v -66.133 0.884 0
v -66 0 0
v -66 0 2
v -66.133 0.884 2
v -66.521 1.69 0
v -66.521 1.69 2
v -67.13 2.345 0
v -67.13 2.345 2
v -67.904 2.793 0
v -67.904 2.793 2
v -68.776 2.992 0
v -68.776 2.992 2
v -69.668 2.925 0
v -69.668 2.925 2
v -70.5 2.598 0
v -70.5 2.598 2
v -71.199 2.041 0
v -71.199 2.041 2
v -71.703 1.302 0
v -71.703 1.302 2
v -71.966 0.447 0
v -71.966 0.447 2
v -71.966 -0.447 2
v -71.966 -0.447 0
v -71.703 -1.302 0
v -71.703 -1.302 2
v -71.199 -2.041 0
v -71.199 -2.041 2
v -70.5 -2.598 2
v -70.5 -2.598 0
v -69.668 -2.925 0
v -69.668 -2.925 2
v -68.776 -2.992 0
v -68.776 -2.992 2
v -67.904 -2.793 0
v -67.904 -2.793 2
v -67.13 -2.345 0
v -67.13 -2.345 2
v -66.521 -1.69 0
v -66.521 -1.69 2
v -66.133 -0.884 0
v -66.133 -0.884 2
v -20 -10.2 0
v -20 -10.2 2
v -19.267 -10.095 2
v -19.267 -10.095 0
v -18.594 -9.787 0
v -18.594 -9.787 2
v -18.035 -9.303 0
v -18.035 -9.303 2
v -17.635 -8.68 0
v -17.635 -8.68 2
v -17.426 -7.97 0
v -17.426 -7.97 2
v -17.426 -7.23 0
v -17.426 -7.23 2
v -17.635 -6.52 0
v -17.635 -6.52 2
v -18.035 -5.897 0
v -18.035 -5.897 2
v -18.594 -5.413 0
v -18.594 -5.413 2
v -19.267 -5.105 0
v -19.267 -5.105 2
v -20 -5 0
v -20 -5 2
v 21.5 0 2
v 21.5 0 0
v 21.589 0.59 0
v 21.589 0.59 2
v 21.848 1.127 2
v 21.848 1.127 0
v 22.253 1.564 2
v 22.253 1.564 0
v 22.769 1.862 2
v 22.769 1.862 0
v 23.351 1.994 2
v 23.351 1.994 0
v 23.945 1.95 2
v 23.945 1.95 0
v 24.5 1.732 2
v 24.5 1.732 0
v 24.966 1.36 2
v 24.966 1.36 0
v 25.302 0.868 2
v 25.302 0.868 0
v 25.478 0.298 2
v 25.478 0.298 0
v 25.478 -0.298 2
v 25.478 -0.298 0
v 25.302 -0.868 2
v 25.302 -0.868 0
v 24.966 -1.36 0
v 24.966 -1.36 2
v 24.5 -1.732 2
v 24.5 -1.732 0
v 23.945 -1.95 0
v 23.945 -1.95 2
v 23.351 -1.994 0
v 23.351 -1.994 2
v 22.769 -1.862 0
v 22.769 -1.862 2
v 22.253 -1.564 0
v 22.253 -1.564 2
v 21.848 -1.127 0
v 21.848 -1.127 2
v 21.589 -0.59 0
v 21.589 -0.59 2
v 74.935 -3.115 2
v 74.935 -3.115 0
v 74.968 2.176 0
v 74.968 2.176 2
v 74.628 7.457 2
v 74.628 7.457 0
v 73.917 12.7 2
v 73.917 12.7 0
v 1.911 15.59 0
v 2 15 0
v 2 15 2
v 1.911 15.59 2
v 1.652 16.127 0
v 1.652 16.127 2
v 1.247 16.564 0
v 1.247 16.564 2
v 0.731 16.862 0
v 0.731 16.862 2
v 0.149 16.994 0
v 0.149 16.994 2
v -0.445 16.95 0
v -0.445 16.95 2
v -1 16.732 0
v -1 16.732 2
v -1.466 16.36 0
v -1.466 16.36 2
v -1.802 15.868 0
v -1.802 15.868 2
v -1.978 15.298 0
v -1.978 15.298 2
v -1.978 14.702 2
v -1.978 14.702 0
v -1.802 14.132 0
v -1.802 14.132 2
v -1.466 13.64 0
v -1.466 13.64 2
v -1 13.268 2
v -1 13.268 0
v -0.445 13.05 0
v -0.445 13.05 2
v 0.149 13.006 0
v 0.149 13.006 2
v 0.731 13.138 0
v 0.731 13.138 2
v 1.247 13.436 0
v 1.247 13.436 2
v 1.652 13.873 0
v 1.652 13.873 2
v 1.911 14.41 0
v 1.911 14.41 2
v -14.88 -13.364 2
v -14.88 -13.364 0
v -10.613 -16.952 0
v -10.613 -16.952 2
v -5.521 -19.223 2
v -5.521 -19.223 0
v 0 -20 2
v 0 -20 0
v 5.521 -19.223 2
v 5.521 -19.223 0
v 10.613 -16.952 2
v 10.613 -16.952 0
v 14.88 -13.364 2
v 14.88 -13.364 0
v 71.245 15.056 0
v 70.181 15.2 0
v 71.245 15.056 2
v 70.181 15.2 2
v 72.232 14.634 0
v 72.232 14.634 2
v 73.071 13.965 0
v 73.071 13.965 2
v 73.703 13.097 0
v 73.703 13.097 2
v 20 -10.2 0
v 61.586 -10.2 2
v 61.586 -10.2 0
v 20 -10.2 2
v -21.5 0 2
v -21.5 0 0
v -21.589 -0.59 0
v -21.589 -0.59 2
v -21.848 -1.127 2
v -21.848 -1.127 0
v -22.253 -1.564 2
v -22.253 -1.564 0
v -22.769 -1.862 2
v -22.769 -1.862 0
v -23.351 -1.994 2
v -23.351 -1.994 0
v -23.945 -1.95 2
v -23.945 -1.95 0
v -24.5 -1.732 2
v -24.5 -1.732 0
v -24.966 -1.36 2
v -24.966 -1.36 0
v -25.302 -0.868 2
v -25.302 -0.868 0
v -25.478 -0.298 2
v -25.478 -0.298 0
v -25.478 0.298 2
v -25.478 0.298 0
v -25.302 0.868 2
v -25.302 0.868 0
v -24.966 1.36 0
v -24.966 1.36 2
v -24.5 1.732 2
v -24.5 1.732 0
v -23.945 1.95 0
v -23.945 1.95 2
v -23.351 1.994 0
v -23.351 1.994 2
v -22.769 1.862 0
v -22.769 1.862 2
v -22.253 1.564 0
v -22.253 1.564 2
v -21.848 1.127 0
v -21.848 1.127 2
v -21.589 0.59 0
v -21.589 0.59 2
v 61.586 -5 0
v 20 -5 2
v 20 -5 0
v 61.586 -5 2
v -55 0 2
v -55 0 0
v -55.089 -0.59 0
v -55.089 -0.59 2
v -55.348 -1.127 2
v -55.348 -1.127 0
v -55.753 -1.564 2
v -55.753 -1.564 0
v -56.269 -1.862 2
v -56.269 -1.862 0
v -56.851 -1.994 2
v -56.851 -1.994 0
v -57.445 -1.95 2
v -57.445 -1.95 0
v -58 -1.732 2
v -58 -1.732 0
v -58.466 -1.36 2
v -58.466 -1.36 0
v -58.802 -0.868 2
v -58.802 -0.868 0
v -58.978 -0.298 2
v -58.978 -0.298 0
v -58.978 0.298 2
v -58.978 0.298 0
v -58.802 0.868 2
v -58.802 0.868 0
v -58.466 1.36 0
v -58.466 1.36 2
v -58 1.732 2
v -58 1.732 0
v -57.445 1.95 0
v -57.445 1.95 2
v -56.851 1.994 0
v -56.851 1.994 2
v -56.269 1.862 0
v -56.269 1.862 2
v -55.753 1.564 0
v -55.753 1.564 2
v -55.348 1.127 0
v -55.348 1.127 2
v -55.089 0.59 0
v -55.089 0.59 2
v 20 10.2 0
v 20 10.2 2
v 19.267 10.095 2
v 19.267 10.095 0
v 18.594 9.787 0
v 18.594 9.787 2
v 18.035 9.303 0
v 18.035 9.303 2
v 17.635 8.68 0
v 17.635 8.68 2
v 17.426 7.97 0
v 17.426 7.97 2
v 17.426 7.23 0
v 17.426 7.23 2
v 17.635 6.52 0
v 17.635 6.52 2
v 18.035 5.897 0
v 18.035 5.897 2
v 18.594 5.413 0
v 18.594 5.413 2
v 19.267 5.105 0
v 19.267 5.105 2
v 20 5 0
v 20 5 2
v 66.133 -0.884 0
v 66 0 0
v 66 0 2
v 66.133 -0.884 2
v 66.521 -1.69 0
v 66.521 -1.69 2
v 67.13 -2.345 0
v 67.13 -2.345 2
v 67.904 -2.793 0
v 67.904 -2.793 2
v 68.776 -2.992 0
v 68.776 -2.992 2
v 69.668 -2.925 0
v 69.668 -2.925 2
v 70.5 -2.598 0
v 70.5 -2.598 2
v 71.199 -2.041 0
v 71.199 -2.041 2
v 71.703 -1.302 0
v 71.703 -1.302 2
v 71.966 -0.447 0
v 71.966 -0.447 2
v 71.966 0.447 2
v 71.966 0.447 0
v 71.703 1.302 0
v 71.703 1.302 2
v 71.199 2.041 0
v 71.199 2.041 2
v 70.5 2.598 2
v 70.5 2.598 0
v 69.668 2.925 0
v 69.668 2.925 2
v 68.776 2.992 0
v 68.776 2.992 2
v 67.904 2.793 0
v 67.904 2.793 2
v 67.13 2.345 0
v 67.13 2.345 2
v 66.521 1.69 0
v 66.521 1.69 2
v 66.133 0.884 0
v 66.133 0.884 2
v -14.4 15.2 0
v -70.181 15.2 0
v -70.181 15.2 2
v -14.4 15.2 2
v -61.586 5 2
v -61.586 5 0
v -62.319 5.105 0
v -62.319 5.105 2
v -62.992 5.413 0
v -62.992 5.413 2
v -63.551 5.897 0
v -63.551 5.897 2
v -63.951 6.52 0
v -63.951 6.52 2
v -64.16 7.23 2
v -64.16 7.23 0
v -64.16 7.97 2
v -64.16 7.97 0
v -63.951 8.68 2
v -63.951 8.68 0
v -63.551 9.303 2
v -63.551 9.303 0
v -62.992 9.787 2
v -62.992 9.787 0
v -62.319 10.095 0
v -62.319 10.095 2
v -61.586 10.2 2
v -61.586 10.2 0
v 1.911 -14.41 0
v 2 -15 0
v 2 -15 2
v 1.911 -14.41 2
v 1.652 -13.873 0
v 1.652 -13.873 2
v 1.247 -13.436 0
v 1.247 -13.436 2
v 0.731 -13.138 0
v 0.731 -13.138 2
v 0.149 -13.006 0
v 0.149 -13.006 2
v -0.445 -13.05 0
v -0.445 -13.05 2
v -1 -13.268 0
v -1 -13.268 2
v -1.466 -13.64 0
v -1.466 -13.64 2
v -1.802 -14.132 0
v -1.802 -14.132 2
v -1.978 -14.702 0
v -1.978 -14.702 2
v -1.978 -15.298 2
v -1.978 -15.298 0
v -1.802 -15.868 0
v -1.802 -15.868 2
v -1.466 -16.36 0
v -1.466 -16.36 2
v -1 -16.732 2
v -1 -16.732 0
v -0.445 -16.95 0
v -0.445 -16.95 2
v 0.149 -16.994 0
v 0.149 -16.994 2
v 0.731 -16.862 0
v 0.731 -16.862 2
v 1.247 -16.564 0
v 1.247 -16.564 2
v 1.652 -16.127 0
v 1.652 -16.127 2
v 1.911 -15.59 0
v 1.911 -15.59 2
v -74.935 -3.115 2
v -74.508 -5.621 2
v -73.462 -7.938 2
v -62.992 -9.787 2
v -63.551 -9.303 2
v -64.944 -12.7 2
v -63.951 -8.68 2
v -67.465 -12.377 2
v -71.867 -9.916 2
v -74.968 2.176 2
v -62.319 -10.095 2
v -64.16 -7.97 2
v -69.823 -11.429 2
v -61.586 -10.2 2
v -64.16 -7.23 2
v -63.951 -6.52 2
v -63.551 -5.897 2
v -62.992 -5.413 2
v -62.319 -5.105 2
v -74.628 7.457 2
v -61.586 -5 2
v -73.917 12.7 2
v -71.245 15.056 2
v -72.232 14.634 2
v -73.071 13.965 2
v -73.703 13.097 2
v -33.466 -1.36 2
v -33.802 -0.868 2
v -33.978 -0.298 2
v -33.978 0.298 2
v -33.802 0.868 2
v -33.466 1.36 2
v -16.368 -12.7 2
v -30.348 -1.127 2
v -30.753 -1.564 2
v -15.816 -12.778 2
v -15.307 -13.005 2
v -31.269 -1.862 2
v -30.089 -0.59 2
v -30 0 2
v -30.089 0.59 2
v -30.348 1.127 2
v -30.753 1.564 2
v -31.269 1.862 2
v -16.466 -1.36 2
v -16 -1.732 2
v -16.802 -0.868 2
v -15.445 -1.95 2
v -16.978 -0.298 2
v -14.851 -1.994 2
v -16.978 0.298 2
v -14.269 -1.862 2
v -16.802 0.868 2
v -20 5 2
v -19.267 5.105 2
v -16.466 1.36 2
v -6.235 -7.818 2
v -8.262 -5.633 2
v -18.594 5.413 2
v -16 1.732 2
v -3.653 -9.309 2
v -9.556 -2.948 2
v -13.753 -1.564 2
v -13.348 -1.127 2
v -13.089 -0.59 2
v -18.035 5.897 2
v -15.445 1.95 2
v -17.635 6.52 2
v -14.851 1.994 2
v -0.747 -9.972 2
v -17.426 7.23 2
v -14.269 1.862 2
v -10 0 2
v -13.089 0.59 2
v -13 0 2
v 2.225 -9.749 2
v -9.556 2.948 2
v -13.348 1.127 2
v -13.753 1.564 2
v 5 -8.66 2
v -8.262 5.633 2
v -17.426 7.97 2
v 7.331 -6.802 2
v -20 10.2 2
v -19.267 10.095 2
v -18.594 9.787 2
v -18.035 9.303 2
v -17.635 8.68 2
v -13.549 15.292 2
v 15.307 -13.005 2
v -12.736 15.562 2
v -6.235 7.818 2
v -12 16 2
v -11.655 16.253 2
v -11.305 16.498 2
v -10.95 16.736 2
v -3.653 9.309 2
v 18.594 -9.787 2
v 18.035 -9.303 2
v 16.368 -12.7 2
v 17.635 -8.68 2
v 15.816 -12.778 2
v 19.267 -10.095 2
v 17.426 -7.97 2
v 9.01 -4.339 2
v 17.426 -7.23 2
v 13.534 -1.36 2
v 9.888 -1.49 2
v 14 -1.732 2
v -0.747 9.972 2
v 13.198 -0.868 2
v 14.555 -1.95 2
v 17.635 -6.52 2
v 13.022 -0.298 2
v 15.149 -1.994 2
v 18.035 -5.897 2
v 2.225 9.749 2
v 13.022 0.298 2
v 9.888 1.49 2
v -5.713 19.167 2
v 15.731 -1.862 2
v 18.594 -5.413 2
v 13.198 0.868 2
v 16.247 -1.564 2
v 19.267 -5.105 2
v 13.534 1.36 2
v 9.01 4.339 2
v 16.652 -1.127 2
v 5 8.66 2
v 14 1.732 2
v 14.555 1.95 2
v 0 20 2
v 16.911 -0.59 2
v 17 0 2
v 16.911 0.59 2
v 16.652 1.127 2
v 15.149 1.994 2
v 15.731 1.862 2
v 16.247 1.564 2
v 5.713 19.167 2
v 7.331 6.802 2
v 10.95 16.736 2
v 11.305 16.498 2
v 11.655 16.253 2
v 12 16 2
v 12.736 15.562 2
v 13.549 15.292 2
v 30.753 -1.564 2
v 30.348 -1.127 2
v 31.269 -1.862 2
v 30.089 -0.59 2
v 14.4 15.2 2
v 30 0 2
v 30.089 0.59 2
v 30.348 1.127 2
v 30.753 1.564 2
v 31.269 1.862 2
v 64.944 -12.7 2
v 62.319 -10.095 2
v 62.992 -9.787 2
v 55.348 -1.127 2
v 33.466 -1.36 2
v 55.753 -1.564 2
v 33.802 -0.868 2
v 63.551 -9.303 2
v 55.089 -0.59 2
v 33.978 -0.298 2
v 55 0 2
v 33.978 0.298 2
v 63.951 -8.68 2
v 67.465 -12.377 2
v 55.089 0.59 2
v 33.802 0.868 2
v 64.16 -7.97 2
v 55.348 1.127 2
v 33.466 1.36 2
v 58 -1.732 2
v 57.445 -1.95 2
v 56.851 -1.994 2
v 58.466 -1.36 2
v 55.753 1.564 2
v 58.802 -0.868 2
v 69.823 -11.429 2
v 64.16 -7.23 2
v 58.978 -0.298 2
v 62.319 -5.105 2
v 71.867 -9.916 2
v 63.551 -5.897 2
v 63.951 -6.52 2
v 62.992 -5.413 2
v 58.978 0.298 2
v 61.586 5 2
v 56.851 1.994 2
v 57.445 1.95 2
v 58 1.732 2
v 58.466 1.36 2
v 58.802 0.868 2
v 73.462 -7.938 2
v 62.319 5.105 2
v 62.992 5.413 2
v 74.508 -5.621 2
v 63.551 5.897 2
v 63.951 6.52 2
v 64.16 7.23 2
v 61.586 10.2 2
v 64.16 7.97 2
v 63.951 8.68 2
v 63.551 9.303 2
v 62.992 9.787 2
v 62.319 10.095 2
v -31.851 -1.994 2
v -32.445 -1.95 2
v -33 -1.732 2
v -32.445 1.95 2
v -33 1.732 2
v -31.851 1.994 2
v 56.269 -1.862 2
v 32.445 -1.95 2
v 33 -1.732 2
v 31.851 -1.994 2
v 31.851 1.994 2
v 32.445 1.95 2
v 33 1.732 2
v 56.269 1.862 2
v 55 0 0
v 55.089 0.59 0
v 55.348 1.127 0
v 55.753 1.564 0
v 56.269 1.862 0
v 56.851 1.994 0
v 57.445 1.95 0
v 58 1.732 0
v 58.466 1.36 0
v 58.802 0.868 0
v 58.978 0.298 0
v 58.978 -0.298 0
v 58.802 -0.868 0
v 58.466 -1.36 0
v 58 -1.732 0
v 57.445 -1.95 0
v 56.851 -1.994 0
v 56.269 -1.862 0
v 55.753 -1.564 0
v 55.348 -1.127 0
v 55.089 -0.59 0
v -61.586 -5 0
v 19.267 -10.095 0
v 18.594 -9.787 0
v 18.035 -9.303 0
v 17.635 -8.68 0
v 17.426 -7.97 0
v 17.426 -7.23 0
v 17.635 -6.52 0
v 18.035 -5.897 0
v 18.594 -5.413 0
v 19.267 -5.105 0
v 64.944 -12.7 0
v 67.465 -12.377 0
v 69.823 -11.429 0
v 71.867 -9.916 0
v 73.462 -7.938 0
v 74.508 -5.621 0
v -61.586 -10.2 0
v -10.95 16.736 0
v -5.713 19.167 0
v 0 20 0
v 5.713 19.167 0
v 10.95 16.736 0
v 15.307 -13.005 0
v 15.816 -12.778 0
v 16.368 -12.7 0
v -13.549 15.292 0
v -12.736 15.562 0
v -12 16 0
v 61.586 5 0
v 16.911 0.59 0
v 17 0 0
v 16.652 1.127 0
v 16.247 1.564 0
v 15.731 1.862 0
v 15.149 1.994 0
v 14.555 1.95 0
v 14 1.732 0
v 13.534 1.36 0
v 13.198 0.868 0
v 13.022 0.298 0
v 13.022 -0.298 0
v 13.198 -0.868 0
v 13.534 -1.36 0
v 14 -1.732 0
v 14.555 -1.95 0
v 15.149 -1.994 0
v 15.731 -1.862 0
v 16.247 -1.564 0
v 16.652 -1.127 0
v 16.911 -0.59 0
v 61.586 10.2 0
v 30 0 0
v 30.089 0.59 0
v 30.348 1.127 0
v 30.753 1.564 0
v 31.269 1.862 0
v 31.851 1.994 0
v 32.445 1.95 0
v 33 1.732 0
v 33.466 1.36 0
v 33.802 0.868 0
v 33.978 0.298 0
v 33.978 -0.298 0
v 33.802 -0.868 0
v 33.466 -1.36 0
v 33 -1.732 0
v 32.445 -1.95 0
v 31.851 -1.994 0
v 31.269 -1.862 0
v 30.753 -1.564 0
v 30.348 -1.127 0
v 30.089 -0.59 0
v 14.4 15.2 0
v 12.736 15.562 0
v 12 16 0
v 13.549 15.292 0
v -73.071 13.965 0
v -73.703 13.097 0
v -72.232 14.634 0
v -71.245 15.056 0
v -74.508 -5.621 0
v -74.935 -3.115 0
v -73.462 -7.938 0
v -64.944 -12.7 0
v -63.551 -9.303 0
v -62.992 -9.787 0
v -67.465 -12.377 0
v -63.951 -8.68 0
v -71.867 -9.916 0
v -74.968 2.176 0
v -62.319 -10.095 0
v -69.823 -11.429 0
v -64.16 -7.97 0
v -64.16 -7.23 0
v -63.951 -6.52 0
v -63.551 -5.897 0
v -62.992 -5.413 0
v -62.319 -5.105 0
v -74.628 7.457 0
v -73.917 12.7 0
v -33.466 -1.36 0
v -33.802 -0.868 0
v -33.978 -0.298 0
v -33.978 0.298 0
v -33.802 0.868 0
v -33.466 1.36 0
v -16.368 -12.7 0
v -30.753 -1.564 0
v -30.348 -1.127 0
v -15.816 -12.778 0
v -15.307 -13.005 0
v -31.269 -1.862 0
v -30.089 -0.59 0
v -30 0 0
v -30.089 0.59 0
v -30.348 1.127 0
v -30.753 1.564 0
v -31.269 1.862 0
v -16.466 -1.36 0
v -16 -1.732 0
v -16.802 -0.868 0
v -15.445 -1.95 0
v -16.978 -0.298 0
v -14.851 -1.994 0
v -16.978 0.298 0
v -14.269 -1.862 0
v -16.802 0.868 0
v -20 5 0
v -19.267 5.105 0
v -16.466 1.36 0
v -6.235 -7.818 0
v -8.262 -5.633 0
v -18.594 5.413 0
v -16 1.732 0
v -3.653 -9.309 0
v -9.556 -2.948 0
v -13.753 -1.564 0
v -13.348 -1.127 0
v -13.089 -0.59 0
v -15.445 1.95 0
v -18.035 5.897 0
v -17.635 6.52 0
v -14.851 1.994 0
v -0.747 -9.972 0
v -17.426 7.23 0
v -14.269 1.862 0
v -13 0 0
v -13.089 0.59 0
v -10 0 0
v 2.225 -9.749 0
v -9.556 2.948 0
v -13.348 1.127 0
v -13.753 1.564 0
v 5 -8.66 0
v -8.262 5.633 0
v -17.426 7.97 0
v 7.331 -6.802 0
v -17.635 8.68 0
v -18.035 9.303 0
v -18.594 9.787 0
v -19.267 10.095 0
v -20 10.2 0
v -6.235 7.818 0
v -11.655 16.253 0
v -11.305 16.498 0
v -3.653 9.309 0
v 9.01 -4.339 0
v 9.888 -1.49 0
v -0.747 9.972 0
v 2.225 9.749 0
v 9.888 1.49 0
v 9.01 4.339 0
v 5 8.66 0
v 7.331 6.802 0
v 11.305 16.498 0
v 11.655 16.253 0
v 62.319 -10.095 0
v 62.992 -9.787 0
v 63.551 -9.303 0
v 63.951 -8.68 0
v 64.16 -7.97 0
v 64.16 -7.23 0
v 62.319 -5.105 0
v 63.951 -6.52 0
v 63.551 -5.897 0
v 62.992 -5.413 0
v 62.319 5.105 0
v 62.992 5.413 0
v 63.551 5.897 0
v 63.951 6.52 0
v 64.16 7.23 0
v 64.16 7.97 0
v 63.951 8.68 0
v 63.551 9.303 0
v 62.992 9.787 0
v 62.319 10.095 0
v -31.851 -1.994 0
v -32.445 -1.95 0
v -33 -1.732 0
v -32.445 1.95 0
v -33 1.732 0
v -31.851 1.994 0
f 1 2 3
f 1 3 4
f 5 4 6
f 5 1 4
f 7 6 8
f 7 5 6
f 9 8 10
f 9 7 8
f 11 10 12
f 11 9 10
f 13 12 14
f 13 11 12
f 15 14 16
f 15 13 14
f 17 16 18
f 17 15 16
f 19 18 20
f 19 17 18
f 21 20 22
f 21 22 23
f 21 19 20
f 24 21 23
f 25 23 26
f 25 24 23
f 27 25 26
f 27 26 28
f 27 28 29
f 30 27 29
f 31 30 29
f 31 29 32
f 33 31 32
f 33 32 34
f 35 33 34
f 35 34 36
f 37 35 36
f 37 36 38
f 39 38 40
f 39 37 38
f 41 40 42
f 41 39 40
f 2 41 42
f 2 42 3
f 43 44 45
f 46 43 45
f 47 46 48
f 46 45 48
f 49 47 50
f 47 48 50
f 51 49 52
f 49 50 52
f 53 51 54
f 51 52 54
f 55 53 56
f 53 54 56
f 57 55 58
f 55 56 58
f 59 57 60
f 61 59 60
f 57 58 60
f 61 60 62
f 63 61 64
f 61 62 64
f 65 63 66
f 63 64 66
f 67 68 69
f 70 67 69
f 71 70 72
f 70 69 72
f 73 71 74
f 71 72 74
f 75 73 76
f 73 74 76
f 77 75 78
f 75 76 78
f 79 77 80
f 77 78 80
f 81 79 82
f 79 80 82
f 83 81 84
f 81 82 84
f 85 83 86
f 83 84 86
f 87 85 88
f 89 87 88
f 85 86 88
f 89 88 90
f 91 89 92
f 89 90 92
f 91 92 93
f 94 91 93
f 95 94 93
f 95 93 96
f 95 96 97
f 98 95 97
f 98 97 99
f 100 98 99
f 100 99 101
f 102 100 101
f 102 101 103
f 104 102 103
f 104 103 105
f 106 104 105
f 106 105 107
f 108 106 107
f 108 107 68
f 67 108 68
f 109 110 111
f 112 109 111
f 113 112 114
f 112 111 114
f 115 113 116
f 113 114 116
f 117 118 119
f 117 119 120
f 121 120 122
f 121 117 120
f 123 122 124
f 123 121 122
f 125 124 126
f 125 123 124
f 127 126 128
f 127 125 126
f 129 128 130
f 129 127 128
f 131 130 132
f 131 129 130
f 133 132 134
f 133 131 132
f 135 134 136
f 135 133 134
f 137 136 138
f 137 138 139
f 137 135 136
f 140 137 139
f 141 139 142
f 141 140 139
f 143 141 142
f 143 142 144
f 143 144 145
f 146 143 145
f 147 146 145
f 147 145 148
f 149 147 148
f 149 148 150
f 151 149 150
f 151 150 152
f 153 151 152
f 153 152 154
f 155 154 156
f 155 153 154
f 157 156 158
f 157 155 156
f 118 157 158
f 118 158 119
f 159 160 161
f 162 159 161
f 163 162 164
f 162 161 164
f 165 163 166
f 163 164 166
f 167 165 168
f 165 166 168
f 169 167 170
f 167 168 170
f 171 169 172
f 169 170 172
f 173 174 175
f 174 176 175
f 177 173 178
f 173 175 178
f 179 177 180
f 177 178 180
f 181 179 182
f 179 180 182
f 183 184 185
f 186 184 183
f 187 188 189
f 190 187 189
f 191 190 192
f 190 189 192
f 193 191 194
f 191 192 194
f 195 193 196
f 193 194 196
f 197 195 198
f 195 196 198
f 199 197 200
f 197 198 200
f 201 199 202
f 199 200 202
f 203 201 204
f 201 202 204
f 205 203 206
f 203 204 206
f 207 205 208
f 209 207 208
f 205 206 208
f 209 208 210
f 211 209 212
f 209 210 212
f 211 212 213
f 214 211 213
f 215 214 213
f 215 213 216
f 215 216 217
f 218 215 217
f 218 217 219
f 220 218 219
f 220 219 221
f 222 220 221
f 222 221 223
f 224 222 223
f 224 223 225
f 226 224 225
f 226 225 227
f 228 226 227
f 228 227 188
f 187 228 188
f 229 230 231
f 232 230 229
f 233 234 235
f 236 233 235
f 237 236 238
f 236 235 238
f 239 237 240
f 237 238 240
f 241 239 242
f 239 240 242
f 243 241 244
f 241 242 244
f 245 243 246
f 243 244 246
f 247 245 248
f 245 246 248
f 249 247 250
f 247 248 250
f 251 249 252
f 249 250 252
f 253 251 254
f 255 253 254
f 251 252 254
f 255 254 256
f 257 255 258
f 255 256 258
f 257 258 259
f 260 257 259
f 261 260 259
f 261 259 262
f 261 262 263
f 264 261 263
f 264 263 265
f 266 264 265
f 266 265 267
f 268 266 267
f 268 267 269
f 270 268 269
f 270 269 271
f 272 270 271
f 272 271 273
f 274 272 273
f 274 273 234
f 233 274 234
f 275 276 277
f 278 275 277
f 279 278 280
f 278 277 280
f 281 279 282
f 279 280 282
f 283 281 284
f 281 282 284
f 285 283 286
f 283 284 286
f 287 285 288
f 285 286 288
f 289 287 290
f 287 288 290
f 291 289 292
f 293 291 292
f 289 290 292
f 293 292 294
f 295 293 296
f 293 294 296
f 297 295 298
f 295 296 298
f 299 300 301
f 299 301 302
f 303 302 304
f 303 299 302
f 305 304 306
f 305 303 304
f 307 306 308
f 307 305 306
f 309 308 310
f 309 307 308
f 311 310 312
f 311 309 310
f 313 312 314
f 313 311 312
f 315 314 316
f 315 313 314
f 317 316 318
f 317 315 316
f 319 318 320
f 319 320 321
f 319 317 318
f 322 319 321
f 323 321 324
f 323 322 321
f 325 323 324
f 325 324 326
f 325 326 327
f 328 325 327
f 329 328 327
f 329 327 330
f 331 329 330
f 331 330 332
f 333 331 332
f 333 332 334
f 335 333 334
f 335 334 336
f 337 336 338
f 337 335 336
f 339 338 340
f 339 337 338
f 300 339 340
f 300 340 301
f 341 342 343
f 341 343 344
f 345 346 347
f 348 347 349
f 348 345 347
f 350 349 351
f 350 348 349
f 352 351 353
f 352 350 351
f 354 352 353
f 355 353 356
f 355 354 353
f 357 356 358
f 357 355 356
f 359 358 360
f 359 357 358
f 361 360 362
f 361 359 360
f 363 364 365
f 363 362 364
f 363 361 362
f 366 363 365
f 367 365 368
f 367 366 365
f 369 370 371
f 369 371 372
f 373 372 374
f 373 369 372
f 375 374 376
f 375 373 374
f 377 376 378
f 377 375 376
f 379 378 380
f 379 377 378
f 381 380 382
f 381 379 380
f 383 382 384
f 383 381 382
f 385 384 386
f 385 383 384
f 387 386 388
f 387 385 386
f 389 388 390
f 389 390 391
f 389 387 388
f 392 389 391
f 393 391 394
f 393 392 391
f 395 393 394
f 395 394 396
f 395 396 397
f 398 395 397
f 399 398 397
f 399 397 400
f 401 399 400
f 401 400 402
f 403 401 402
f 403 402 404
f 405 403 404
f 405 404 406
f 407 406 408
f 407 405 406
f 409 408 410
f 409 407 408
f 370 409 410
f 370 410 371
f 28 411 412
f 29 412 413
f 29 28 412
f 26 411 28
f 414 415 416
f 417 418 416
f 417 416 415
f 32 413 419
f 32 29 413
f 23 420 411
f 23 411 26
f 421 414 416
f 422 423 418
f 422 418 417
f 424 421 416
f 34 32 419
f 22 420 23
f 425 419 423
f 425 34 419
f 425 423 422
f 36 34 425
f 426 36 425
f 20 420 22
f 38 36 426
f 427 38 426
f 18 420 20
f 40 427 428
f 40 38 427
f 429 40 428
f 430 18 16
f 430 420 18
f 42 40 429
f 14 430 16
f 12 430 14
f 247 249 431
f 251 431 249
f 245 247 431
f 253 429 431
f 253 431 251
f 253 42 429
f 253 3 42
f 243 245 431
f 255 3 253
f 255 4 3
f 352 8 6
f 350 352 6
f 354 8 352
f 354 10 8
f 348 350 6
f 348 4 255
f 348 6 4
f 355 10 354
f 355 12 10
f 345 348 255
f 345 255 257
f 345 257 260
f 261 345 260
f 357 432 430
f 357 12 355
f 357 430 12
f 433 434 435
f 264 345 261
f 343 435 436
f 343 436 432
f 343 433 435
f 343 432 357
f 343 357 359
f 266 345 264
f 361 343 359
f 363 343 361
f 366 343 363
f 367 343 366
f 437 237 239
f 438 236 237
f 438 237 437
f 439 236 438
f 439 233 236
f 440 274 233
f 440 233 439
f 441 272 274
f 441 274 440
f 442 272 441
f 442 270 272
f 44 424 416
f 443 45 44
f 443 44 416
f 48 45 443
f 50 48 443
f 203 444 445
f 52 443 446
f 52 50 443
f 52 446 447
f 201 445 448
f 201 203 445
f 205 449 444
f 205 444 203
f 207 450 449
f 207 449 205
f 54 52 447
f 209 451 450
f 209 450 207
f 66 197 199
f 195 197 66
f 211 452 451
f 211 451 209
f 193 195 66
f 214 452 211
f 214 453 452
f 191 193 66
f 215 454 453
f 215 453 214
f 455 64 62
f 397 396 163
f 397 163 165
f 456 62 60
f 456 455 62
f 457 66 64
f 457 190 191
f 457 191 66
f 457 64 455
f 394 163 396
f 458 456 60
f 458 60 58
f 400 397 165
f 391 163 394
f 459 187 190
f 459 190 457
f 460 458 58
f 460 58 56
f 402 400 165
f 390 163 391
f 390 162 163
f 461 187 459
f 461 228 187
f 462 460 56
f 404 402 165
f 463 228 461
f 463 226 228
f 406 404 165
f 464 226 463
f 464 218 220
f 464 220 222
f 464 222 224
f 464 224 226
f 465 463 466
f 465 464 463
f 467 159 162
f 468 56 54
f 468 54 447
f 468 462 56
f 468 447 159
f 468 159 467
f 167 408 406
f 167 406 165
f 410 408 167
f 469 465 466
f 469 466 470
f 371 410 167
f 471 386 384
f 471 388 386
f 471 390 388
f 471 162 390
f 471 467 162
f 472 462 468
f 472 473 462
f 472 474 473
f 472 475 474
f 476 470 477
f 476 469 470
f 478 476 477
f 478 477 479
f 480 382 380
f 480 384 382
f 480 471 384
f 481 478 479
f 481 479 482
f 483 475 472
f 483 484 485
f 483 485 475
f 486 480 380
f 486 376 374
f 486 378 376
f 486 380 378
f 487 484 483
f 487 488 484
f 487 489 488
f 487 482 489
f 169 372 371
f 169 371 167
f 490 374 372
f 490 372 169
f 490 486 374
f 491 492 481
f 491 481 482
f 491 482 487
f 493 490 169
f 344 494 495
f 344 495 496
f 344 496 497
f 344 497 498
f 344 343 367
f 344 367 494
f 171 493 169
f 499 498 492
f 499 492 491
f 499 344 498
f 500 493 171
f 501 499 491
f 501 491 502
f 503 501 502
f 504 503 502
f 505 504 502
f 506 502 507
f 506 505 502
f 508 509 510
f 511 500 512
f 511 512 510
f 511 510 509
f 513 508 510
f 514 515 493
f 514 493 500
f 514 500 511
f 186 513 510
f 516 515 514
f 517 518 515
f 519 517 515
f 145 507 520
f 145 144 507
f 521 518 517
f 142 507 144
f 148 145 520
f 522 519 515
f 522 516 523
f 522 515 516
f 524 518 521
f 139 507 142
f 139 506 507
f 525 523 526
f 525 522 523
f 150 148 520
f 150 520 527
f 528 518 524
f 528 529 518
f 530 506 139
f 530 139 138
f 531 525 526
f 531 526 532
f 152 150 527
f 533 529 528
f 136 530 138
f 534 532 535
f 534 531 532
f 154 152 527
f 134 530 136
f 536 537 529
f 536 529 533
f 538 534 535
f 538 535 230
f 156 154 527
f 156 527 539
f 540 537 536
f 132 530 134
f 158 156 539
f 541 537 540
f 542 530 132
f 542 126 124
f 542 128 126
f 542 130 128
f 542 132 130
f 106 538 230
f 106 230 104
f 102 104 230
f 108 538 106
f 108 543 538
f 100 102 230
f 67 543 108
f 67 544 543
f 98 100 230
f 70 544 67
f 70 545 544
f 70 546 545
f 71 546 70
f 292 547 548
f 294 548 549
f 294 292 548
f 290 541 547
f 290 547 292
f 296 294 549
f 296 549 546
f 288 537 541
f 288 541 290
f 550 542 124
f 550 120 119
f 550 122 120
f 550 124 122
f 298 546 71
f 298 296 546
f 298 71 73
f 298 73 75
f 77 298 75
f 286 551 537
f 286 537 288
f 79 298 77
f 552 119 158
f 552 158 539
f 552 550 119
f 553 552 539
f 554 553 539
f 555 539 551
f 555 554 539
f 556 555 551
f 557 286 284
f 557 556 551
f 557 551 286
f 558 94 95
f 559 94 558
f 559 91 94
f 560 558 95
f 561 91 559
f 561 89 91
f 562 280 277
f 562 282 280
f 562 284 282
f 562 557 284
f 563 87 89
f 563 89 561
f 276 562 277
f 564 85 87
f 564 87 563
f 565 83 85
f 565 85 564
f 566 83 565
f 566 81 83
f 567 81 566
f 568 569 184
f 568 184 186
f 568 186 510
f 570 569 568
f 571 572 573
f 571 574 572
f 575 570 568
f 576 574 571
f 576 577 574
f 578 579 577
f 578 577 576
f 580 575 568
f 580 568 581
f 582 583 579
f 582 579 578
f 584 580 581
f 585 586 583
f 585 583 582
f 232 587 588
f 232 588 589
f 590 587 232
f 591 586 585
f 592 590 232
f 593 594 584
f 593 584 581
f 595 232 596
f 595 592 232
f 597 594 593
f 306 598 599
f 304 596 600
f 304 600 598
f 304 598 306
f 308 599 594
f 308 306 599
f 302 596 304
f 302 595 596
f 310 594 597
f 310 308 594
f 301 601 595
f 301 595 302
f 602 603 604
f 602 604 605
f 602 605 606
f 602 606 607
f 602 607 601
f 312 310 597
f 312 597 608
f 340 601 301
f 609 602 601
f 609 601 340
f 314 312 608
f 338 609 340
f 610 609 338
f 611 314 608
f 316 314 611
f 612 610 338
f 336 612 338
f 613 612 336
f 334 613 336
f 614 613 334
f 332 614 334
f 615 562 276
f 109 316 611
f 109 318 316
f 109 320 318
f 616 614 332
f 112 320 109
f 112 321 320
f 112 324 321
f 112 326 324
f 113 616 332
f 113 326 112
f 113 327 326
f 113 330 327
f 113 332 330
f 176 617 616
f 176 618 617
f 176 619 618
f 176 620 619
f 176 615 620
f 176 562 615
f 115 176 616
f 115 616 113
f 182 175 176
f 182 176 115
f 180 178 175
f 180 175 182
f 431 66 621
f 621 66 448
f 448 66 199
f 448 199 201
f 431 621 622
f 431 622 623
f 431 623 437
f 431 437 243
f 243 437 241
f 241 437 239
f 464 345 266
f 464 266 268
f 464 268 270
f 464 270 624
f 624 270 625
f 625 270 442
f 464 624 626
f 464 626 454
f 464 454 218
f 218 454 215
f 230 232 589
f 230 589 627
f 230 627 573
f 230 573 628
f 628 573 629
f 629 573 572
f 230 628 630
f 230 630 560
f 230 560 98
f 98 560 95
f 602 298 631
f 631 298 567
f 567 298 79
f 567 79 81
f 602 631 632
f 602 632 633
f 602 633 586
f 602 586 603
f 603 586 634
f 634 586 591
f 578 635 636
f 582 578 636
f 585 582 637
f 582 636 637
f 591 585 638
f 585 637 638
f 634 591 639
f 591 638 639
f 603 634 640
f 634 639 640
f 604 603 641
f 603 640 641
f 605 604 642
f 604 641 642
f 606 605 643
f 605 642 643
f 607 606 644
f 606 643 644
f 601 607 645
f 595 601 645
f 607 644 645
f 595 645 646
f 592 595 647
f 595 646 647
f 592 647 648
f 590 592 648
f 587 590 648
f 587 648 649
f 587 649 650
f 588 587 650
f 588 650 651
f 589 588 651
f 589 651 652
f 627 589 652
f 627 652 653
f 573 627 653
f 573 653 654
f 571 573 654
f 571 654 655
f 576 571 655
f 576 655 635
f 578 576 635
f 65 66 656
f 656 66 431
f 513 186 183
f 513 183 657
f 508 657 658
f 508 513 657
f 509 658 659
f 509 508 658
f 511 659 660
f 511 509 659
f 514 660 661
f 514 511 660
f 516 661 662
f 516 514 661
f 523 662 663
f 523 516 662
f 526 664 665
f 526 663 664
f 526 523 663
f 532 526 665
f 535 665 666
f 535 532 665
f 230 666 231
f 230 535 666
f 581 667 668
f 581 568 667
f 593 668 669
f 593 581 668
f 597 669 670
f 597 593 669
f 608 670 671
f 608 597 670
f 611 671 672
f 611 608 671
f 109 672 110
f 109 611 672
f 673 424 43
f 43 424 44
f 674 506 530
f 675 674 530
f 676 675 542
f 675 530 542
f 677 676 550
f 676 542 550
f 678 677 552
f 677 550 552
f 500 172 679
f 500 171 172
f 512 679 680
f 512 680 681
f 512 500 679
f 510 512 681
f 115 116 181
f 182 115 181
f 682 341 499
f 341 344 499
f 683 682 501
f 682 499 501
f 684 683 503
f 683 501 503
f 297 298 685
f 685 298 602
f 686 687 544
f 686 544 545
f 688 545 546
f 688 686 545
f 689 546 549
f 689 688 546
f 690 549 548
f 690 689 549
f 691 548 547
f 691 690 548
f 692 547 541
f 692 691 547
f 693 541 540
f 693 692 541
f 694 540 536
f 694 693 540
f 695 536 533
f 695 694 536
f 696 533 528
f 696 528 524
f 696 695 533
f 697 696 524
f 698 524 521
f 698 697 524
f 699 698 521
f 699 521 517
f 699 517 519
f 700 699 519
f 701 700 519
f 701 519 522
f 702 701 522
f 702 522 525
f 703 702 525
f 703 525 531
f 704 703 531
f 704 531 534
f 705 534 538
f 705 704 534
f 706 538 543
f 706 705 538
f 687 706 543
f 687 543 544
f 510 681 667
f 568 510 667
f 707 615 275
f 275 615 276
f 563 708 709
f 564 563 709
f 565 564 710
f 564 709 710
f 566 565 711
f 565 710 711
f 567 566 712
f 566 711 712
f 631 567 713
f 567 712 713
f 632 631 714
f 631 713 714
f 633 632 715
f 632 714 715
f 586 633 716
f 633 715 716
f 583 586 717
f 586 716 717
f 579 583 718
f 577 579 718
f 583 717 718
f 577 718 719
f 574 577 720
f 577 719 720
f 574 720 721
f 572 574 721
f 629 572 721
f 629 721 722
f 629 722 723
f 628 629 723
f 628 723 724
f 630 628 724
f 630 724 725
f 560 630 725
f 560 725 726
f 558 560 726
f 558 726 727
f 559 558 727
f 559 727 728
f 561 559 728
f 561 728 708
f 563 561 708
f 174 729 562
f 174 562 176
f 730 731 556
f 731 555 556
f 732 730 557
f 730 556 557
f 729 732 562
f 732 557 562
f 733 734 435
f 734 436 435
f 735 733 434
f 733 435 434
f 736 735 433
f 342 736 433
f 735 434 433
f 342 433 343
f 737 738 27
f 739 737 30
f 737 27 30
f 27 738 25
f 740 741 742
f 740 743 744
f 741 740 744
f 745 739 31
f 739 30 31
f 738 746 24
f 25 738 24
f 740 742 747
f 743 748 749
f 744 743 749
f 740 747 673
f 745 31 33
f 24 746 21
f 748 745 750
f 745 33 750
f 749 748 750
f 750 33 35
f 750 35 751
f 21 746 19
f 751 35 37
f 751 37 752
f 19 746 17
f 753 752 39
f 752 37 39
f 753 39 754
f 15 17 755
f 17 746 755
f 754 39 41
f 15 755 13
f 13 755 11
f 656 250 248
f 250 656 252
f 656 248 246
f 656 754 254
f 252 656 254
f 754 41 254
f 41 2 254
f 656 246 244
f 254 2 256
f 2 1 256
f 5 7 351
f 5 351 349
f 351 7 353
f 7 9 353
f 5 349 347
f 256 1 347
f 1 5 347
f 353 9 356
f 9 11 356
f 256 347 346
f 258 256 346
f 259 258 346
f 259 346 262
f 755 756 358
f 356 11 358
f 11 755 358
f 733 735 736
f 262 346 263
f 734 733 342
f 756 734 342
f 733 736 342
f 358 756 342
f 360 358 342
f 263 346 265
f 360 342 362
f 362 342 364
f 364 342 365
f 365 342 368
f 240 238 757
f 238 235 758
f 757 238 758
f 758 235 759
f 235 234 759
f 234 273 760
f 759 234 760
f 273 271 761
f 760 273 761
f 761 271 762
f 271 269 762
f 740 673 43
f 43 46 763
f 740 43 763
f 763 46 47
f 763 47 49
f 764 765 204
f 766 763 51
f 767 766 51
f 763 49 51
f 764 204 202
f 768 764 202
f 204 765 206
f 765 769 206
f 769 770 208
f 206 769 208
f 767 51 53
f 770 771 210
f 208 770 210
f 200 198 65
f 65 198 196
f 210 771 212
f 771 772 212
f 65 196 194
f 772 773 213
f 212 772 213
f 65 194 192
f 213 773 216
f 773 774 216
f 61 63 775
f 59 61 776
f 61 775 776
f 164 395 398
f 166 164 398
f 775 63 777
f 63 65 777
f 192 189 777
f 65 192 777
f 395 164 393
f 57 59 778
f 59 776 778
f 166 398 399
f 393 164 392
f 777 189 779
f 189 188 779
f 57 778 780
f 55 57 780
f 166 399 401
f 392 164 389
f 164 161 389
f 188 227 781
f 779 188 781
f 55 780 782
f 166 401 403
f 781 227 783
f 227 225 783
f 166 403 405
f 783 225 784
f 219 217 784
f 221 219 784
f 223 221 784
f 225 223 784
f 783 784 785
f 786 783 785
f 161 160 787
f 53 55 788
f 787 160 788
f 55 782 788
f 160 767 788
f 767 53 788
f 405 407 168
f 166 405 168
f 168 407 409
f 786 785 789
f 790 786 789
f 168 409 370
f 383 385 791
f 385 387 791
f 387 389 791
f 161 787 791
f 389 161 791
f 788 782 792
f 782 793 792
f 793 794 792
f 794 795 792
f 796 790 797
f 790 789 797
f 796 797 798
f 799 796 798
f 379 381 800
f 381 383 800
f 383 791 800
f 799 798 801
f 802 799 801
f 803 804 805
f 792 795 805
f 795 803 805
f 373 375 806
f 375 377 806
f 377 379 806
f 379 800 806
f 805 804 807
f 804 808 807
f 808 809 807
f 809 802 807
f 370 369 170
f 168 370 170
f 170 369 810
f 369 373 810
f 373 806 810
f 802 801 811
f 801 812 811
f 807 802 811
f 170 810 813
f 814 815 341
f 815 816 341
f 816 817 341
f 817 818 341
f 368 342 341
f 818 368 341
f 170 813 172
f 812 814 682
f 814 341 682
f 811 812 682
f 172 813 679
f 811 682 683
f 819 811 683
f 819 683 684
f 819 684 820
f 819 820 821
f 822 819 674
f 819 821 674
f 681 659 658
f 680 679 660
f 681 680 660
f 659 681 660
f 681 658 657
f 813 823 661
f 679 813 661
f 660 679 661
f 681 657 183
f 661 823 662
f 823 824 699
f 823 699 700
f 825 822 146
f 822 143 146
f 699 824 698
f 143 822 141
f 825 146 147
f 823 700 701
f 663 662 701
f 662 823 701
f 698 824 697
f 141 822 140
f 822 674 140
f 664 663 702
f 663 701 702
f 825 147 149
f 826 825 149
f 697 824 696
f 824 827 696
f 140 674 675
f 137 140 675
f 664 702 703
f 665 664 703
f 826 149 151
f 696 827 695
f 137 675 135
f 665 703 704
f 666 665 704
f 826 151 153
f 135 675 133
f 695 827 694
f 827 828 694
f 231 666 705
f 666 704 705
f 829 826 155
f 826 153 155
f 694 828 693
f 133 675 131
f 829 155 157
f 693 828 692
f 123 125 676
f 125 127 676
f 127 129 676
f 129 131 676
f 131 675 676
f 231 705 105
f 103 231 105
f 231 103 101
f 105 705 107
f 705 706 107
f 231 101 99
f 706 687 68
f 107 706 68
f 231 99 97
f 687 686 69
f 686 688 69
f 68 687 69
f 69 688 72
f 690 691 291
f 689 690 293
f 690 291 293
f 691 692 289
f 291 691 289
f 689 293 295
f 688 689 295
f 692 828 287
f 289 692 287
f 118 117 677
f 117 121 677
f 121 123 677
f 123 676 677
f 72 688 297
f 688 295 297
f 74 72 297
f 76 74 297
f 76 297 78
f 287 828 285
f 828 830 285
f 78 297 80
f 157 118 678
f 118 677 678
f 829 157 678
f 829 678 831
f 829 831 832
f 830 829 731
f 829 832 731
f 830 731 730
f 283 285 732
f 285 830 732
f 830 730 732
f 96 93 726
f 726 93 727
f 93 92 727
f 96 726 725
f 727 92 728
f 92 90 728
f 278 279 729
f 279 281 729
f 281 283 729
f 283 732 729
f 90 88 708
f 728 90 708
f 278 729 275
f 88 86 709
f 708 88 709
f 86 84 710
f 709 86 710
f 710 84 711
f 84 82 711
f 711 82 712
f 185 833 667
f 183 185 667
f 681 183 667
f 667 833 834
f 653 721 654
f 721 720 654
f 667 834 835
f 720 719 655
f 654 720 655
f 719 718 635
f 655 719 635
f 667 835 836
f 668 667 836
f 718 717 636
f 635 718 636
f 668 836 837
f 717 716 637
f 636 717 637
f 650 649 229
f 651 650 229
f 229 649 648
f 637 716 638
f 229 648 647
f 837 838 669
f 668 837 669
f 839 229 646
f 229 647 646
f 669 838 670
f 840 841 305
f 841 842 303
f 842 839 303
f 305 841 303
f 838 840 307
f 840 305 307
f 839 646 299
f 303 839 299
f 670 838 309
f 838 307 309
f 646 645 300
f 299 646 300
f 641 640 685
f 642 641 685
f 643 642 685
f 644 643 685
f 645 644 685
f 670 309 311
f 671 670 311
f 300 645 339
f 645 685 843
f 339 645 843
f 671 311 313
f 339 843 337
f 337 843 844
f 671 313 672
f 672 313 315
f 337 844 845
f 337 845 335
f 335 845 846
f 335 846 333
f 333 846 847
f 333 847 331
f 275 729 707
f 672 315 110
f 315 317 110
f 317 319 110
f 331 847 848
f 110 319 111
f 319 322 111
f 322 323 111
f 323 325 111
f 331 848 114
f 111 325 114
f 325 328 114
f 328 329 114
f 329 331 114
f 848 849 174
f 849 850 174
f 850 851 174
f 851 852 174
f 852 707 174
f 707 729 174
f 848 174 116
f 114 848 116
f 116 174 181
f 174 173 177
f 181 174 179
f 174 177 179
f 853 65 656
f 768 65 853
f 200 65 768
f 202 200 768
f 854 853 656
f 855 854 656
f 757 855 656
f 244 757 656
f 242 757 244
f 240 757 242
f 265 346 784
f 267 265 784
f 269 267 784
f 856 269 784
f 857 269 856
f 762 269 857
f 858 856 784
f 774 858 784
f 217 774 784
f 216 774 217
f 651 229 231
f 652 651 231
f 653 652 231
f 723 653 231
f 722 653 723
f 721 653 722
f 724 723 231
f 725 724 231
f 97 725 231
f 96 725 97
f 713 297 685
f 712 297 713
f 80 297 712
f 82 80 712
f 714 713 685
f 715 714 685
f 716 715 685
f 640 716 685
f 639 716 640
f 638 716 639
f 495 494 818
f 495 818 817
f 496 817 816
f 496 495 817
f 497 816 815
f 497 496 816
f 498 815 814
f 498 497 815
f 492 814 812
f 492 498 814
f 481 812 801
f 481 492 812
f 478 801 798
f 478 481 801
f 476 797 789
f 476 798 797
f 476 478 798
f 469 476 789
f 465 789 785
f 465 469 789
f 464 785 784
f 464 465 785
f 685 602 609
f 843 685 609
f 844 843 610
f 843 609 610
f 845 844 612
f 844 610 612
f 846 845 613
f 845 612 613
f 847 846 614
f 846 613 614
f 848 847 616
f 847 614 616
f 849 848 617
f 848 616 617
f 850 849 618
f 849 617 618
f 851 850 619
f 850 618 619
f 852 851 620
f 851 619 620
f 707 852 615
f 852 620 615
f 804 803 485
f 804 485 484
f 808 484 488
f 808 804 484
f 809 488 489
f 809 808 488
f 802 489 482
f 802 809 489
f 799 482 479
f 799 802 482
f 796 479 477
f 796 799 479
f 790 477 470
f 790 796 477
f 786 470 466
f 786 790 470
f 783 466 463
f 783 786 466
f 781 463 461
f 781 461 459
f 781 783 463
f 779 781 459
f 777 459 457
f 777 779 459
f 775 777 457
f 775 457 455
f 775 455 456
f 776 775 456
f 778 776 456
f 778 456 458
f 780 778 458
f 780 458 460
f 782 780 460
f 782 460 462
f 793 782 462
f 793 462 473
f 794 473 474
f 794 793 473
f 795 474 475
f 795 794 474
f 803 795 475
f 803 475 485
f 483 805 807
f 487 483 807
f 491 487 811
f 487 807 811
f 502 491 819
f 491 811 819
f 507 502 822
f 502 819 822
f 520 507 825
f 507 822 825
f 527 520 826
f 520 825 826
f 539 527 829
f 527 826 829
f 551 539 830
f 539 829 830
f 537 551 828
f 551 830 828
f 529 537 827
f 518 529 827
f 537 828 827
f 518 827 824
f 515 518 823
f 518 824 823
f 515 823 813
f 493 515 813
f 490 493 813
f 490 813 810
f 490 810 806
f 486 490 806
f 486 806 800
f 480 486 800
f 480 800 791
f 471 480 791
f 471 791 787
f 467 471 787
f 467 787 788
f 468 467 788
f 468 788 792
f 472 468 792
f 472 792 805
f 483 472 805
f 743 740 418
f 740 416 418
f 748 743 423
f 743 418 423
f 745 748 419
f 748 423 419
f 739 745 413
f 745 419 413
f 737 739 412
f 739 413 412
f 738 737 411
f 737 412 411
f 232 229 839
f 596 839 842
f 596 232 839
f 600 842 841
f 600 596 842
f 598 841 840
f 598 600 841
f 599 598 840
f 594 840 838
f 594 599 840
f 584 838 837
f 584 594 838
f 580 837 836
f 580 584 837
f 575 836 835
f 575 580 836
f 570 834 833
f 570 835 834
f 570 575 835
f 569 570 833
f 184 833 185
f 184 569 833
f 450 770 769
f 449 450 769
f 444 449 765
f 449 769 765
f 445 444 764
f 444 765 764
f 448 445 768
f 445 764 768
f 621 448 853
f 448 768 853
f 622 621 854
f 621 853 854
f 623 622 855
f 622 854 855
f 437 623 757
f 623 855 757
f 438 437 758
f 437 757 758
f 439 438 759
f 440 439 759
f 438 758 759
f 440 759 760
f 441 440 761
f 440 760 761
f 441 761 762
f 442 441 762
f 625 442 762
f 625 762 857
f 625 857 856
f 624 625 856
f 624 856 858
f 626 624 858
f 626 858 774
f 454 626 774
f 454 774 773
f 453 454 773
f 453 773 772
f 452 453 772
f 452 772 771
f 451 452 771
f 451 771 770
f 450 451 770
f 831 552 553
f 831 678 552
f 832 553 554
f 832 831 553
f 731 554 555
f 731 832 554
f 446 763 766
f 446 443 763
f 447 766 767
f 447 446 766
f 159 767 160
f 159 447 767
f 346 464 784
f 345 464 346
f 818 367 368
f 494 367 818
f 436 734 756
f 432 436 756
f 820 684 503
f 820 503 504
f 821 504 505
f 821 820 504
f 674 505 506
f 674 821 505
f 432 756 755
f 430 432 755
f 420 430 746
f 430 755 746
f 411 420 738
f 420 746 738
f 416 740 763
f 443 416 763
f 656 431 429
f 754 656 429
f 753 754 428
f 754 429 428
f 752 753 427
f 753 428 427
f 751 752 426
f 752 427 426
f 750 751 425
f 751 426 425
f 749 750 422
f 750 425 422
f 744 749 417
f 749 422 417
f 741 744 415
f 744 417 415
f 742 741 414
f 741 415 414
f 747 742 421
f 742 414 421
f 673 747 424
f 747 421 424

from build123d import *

# Parameters (mm, degrees)
SKETCH1_R           = 2
SKETCH1_R_2         = 3
BOSS_EXTRUDE1_DEPTH = 2
SKETCH3_R           = 10
SKETCH3_R_2         = 2
CUT_EXTRUDE1_DEPTH  = 93.316865626
CUT_EXTRUDE2_DEPTH  = 93.316865626
CUT_EXTRUDE3_DEPTH  = 93.316865626
FILLET1_R           = 2
FILLET2_DEPTH       = 2
FILLET3_DEPTH       = 2
FILLET4_DEPTH       = 2
FILLET5_DEPTH       = 2
FILLET6_R           = 10
CUT_EXTRUDE4_START  = -10
CUT_EXTRUDE4_DEPTH  = 10
FILLET7_R           = 4


with BuildPart() as part:
    # Sketch1 → Boss-Extrude1 (new body)
    with BuildSketch(Plane.XY):
        with BuildLine():
            Line((-73.916912814, -12.7), (-15.450242717, -12.7))
            ThreePointArc((-15.450242717, -12.7), (0, -20), (15.450242717, -12.7))
            Line((15.450242717, -12.7), (73.916912814, -12.7))
            ThreePointArc((73.916912814, -12.7), (75, 0), (73.916912814, 12.7))
            Line((73.916912814, 12.7), (53.192030909, 51.162152625))
            ThreePointArc((53.192030909, 51.162152625), (51.353674008, 53.083322806), (48.790367902, 53.790367902))
            Line((48.790367902, 53.790367902), (-48.790367902, 53.790367902))
            ThreePointArc((-48.790367902, 53.790367902), (-51.353674008, 53.083322806), (-53.192030909, 51.162152625))
            Line((-53.192030909, 51.162152625), (-73.916912814, 12.7))
            ThreePointArc((-73.916912814, 12.7), (-75, 0), (-73.916912814, -12.7))
        make_face()
        with Locations((0, 15)):
            Circle(SKETCH1_R, mode=Mode.SUBTRACT)
        with Locations((15, 0)):
            Circle(SKETCH1_R, mode=Mode.SUBTRACT)
        with Locations((0, -15)):
            Circle(SKETCH1_R, mode=Mode.SUBTRACT)
        with Locations((-15, 0)):
            Circle(SKETCH1_R, mode=Mode.SUBTRACT)
        with Locations((-48.790367902, 48.790367902)):
            Circle(SKETCH1_R_2, mode=Mode.SUBTRACT)
        with Locations((-69, 0)):
            Circle(SKETCH1_R_2, mode=Mode.SUBTRACT)
        with Locations(Location((69, 0, 0), (0, 0, 180))):
            Circle(SKETCH1_R_2, mode=Mode.SUBTRACT)
        with Locations(Location((48.790367902, 48.790367902, 0), (0, 0, 180))):
            Circle(SKETCH1_R_2, mode=Mode.SUBTRACT)
    extrude(amount=BOSS_EXTRUDE1_DEPTH)

    # Sketch3 → Cut-Extrude1 (cut, through all)
    with BuildSketch(Plane(origin=(0, 0, 0), x_dir=(-1, 0, 0), z_dir=(0, 0, -1))):
        Circle(SKETCH3_R)
        with Locations((-57, 0)):
            Circle(SKETCH3_R_2)
        with Locations((-32, 0)):
            Circle(SKETCH3_R_2)
        with Locations((-23.5, 0)):
            Circle(SKETCH3_R_2)
        with Locations(Location((23.5, 0, 0), (0, 0, 180))):
            Circle(SKETCH3_R_2)
        with Locations(Location((32, 0, 0), (0, 0, 180))):
            Circle(SKETCH3_R_2)
        with Locations(Location((57, 0, 0), (0, 0, 180))):
            Circle(SKETCH3_R_2)
    extrude(amount=-CUT_EXTRUDE1_DEPTH, mode=Mode.SUBTRACT)

    # Sketch5 → Cut-Extrude2 (cut, through all)
    with BuildSketch(Plane.XY.offset(2)):
        with BuildLine():
            ThreePointArc((-47.496272676, 43.96073877), (-49.370145809, 43.824095902), (-51.162152637, 44.388704901))
            Line((-51.162152637, 44.388704901), (-66.890145502, 15.2))
            Line((-66.890145502, 15.2), (-18.735533906, 15.2))
            Line((-18.735533906, 15.2), (-47.496272676, 43.96073877))
        make_face()
        with BuildLine():
            ThreePointArc((43.96073877, 47.496272676), (43.833143595, 48.137736941), (43.790367902, 48.790367902))
            Line((43.790367902, 48.790367902), (-43.790367902, 48.790367902))
            ThreePointArc((-43.790367902, 48.790367902), (-43.833143595, 48.137736941), (-43.96073877, 47.496272676))
            Line((-43.96073877, 47.496272676), (-12.263448247, 15.798982153))
            ThreePointArc((-12.263448247, 15.798982153), (0, 20), (12.263448247, 15.798982153))
            Line((12.263448247, 15.798982153), (43.96073877, 47.496272676))
        make_face()
        with BuildLine():
            Line((47.496272676, 43.96073877), (18.735533906, 15.2))
            Line((18.735533906, 15.2), (66.886464241, 15.2))
            Line((66.886464241, 15.2), (51.159299215, 44.387168561))
            ThreePointArc((51.159299215, 44.387168561), (49.368536342, 43.823908272), (47.496272676, 43.96073877))
        make_face()
    extrude(amount=-CUT_EXTRUDE2_DEPTH, mode=Mode.SUBTRACT)

    # Sketch8 → Cut-Extrude3 (cut, through all)
    with BuildSketch(Plane.XY.offset(2)):
        with BuildLine():
            Line((61.58620553, 10.2), (20, 10.2))
            ThreePointArc((20, 10.2), (17.4, 7.6), (20, 5))
            Line((20, 5), (61.58620553, 5))
            ThreePointArc((61.58620553, 5), (64.18620553, 7.6), (61.58620553, 10.2))
        make_face()
        with BuildLine():
            Line((-61.58620553, -10.2), (-20, -10.2))
            ThreePointArc((-20, -10.2), (-17.4, -7.6), (-20, -5))
            Line((-20, -5), (-61.58620553, -5))
            ThreePointArc((-61.58620553, -5), (-64.18620553, -7.6), (-61.58620553, -10.2))
        make_face()
        with BuildLine():
            Line((61.58620553, -10.2), (20, -10.2))
            ThreePointArc((20, -10.2), (17.4, -7.6), (20, -5))
            Line((20, -5), (61.58620553, -5))
            ThreePointArc((61.58620553, -5), (64.18620553, -7.6), (61.58620553, -10.2))
        make_face()
        with BuildLine():
            Line((-61.58620553, 10.2), (-20, 10.2))
            ThreePointArc((-20, 10.2), (-17.4, 7.6), (-20, 5))
            Line((-20, 5), (-61.58620553, 5))
            ThreePointArc((-61.58620553, 5), (-64.18620553, 7.6), (-61.58620553, 10.2))
        make_face()
    extrude(amount=-CUT_EXTRUDE3_DEPTH, mode=Mode.SUBTRACT)

    # Fillet1
    fillet1_edges = [part.edges().sort_by_distance(p)[0] for p in [
        (12.263448247, 15.798982153, 1),
        (-12.263448247, 15.798982153, 1),
        (66.886464241, 15.2, 1),
        (18.735533906, 15.2, 1),
        (-18.735533906, 15.2, 1),
        (-66.890145502, 15.2, 1),
        (-15.450242717, -12.7, 1),
        (15.450242717, -12.7, 1),
    ]]
    fillet(fillet1_edges, radius=FILLET1_R)

    # Fillet2: read off the stored shape, not the designer's step
    # Fillet2 outline → Fillet2 (add)
    with BuildSketch(Plane.XY):
        with BuildLine():
            Line((-43.96073877, 47.496272676), (-43.584387401, 47.119921307))
            add(Edge.make_bspline(
                [(-43.584387401, 47.119921307), (-43.79719002, 47.332723926), (-43.913795032, 47.634492314), (-43.857793188, 47.97201181)],
                knots=[0, 0, 0, 0, 0.414217666, 0.414217666, 0.414217666, 0.414217666], degree=3, weights=[1, 0.829531048, 0.729673348, 0.700426898]))
            ThreePointArc((-43.857793188, 47.97201181), (-43.903473396, 47.732888781), (-43.96073877, 47.496272676))
        make_face()
        with BuildLine():
            ThreePointArc((-43.790367902, 48.790367902), (-43.807252733, 48.379803393), (-43.857793188, 47.97201181))
            add(Edge.make_bspline(
                [(-43.857793188, 47.97201181), (-43.770111484, 48.500463775), (-43.357659279, 48.790367902), (-42.892465766, 48.790367902)],
                knots=[0.414217666, 0.414217666, 0.414217666, 0.414217666, 1, 1, 1, 1], degree=3, weights=[0.700426898, 0.659066873, 0.758924573, 1]))
            Line((-42.892465766, 48.790367902), (-43.790367902, 48.790367902))
        make_face()
    extrude(amount=FILLET2_DEPTH)

    # Fillet3: read off the stored shape, not the designer's step
    # Fillet3 outline → Fillet3 (add)
    with BuildSketch(Plane.XY):
        with BuildLine():
            Line((43.790367902, 48.790367902), (42.892465766, 48.790367902))
            add(Edge.make_bspline(
                [(42.892465766, 48.790367902), (43.357665683, 48.790367902), (43.770121408, 48.5004568), (43.857795774, 47.971996226)],
                knots=[0, 0, 0, 0, 0.585788454, 0.585788454, 0.585788454, 0.585788454], degree=3, weights=[1, 0.758922055, 0.659064787, 0.700428195]))
            ThreePointArc((43.857795774, 47.971996226), (43.807253382, 48.379795521), (43.790367902, 48.790367902))
        make_face()
        with BuildLine():
            ThreePointArc((43.96073877, 47.496272676), (43.903475067, 47.732881061), (43.857795774, 47.971996226))
            add(Edge.make_bspline(
                [(43.857795774, 47.971996226), (43.913791115, 47.634482177), (43.79718623, 47.332720136), (43.584387401, 47.119921307)],
                knots=[0.585788454, 0.585788454, 0.585788454, 0.585788454, 1, 1, 1, 1], degree=3, weights=[0.700428195, 0.729676298, 0.829533567, 1]))
            Line((43.584387401, 47.119921307), (43.96073877, 47.496272676))
        make_face()
    extrude(amount=FILLET3_DEPTH)

    # Fillet4: read off the stored shape, not the designer's step
    # Fillet4 outline → Fillet4 (add)
    with BuildSketch(Plane.XY):
        with BuildLine():
            Line((-51.162152637, 44.388704901), (-52.646203675, 41.634537337))
            add(Edge.make_bspline(
                [(-52.646203675, 41.634537337), (-51.92183636, 42.978850243), (-50.576640467, 43.835721987), (-48.922136441, 43.792104498)],
                knots=[0, 0, 0, 0, 0.585786442, 0.585786442, 0.585786442, 0.585786442], degree=3, weights=[1, 0.842637329, 0.777455577, 0.804454744]))
            ThreePointArc((-48.922136441, 43.792104498), (-50.077196468, 43.958797532), (-51.162152637, 44.388704901))
        make_face()
        with BuildLine():
            ThreePointArc((-47.496272676, 43.96073877), (-48.203119904, 43.824973679), (-48.922136441, 43.792104498))
            add(Edge.make_bspline(
                [(-48.922136441, 43.792104498), (-47.817700519, 43.762988388), (-46.849981733, 43.314447827), (-46.126053502, 42.590519596)],
                knots=[0.585786442, 0.585786442, 0.585786442, 0.585786442, 1, 1, 1, 1], degree=3, weights=[0.804454744, 0.823546038, 0.88872779, 1]))
            Line((-46.126053502, 42.590519596), (-47.496272676, 43.96073877))
        make_face()
    extrude(amount=FILLET4_DEPTH)

    # Fillet5: read off the stored shape, not the designer's step
    # Fillet5 outline → Fillet5 (add)
    with BuildSketch(Plane.XY):
        with BuildLine():
            Line((47.496272676, 43.96073877), (46.127063611, 42.591529705))
            add(Edge.make_bspline(
                [(46.127063611, 42.591529705), (46.850510453, 43.314976547), (47.817619792, 43.763154251), (48.921332432, 43.792083367)],
                knots=[0, 0, 0, 0, 0.414289791, 0.414289791, 0.414289791, 0.414289791], degree=3, weights=[1, 0.888707311, 0.823522047, 0.804444208]))
            ThreePointArc((48.921332432, 43.792083367), (48.202720546, 43.825020926), (47.496272676, 43.96073877))
        make_face()
        with BuildLine():
            ThreePointArc((51.159299215, 44.387168561), (50.075241983, 43.958277402), (48.921332432, 43.792083367))
            add(Edge.make_bspline(
                [(48.921332432, 43.792083367), (50.574149341, 43.835404908), (51.917905025, 42.979314342), (52.641529007, 41.636380946)],
                knots=[0.414289791, 0.414289791, 0.414289791, 0.414289791, 1, 1, 1, 1], degree=3, weights=[0.804444208, 0.777472544, 0.842657808, 1]))
            Line((52.641529007, 41.636380946), (51.159299215, 44.387168561))
        make_face()
    extrude(amount=FILLET5_DEPTH)

    # Fillet6
    fillet6_edges = [part.edges().sort_by_distance(p)[0] for p in [
        (-73.916912814, -12.7, 1),
        (73.916912814, -12.7, 1),
    ]]
    fillet(fillet6_edges, radius=FILLET6_R)

    # Sketch9 → Cut-Extrude4 (cut)
    with BuildSketch(Plane.XY.offset(2).offset(CUT_EXTRUDE4_START)):
        with BuildLine():
            Line((72.569817001, 15.2), (53.192030909, 51.162152625))
            ThreePointArc((53.192030909, 51.162152625), (51.353674008, 53.083322806), (48.790367902, 53.790367902))
            Line((48.790367902, 53.790367902), (-48.790367902, 53.790367902))
            ThreePointArc((-48.790367902, 53.790367902), (-51.353674008, 53.083322806), (-53.192030909, 51.162152625))
            Line((-53.192030909, 51.162152625), (-72.569817001, 15.2))
            Line((-72.569817001, 15.2), (-12.998461447, 15.2))
            ThreePointArc((-12.998461447, 15.2), (0, 20), (12.998461447, 15.2))
            Line((12.998461447, 15.2), (72.569817001, 15.2))
        make_face()
    extrude(amount=CUT_EXTRUDE4_DEPTH, mode=Mode.SUBTRACT)

    # Fillet7
    fillet7_edges = [part.edges().sort_by_distance(p)[0] for p in [
        (-72.569817001, 15.2, 1),
        (72.569817001, 15.2, 1),
        (-12.998461447, 15.2, 1),
        (12.998461447, 15.2, 1),
    ]]
    fillet(fillet7_edges, radius=FILLET7_R)


solid = part.part
